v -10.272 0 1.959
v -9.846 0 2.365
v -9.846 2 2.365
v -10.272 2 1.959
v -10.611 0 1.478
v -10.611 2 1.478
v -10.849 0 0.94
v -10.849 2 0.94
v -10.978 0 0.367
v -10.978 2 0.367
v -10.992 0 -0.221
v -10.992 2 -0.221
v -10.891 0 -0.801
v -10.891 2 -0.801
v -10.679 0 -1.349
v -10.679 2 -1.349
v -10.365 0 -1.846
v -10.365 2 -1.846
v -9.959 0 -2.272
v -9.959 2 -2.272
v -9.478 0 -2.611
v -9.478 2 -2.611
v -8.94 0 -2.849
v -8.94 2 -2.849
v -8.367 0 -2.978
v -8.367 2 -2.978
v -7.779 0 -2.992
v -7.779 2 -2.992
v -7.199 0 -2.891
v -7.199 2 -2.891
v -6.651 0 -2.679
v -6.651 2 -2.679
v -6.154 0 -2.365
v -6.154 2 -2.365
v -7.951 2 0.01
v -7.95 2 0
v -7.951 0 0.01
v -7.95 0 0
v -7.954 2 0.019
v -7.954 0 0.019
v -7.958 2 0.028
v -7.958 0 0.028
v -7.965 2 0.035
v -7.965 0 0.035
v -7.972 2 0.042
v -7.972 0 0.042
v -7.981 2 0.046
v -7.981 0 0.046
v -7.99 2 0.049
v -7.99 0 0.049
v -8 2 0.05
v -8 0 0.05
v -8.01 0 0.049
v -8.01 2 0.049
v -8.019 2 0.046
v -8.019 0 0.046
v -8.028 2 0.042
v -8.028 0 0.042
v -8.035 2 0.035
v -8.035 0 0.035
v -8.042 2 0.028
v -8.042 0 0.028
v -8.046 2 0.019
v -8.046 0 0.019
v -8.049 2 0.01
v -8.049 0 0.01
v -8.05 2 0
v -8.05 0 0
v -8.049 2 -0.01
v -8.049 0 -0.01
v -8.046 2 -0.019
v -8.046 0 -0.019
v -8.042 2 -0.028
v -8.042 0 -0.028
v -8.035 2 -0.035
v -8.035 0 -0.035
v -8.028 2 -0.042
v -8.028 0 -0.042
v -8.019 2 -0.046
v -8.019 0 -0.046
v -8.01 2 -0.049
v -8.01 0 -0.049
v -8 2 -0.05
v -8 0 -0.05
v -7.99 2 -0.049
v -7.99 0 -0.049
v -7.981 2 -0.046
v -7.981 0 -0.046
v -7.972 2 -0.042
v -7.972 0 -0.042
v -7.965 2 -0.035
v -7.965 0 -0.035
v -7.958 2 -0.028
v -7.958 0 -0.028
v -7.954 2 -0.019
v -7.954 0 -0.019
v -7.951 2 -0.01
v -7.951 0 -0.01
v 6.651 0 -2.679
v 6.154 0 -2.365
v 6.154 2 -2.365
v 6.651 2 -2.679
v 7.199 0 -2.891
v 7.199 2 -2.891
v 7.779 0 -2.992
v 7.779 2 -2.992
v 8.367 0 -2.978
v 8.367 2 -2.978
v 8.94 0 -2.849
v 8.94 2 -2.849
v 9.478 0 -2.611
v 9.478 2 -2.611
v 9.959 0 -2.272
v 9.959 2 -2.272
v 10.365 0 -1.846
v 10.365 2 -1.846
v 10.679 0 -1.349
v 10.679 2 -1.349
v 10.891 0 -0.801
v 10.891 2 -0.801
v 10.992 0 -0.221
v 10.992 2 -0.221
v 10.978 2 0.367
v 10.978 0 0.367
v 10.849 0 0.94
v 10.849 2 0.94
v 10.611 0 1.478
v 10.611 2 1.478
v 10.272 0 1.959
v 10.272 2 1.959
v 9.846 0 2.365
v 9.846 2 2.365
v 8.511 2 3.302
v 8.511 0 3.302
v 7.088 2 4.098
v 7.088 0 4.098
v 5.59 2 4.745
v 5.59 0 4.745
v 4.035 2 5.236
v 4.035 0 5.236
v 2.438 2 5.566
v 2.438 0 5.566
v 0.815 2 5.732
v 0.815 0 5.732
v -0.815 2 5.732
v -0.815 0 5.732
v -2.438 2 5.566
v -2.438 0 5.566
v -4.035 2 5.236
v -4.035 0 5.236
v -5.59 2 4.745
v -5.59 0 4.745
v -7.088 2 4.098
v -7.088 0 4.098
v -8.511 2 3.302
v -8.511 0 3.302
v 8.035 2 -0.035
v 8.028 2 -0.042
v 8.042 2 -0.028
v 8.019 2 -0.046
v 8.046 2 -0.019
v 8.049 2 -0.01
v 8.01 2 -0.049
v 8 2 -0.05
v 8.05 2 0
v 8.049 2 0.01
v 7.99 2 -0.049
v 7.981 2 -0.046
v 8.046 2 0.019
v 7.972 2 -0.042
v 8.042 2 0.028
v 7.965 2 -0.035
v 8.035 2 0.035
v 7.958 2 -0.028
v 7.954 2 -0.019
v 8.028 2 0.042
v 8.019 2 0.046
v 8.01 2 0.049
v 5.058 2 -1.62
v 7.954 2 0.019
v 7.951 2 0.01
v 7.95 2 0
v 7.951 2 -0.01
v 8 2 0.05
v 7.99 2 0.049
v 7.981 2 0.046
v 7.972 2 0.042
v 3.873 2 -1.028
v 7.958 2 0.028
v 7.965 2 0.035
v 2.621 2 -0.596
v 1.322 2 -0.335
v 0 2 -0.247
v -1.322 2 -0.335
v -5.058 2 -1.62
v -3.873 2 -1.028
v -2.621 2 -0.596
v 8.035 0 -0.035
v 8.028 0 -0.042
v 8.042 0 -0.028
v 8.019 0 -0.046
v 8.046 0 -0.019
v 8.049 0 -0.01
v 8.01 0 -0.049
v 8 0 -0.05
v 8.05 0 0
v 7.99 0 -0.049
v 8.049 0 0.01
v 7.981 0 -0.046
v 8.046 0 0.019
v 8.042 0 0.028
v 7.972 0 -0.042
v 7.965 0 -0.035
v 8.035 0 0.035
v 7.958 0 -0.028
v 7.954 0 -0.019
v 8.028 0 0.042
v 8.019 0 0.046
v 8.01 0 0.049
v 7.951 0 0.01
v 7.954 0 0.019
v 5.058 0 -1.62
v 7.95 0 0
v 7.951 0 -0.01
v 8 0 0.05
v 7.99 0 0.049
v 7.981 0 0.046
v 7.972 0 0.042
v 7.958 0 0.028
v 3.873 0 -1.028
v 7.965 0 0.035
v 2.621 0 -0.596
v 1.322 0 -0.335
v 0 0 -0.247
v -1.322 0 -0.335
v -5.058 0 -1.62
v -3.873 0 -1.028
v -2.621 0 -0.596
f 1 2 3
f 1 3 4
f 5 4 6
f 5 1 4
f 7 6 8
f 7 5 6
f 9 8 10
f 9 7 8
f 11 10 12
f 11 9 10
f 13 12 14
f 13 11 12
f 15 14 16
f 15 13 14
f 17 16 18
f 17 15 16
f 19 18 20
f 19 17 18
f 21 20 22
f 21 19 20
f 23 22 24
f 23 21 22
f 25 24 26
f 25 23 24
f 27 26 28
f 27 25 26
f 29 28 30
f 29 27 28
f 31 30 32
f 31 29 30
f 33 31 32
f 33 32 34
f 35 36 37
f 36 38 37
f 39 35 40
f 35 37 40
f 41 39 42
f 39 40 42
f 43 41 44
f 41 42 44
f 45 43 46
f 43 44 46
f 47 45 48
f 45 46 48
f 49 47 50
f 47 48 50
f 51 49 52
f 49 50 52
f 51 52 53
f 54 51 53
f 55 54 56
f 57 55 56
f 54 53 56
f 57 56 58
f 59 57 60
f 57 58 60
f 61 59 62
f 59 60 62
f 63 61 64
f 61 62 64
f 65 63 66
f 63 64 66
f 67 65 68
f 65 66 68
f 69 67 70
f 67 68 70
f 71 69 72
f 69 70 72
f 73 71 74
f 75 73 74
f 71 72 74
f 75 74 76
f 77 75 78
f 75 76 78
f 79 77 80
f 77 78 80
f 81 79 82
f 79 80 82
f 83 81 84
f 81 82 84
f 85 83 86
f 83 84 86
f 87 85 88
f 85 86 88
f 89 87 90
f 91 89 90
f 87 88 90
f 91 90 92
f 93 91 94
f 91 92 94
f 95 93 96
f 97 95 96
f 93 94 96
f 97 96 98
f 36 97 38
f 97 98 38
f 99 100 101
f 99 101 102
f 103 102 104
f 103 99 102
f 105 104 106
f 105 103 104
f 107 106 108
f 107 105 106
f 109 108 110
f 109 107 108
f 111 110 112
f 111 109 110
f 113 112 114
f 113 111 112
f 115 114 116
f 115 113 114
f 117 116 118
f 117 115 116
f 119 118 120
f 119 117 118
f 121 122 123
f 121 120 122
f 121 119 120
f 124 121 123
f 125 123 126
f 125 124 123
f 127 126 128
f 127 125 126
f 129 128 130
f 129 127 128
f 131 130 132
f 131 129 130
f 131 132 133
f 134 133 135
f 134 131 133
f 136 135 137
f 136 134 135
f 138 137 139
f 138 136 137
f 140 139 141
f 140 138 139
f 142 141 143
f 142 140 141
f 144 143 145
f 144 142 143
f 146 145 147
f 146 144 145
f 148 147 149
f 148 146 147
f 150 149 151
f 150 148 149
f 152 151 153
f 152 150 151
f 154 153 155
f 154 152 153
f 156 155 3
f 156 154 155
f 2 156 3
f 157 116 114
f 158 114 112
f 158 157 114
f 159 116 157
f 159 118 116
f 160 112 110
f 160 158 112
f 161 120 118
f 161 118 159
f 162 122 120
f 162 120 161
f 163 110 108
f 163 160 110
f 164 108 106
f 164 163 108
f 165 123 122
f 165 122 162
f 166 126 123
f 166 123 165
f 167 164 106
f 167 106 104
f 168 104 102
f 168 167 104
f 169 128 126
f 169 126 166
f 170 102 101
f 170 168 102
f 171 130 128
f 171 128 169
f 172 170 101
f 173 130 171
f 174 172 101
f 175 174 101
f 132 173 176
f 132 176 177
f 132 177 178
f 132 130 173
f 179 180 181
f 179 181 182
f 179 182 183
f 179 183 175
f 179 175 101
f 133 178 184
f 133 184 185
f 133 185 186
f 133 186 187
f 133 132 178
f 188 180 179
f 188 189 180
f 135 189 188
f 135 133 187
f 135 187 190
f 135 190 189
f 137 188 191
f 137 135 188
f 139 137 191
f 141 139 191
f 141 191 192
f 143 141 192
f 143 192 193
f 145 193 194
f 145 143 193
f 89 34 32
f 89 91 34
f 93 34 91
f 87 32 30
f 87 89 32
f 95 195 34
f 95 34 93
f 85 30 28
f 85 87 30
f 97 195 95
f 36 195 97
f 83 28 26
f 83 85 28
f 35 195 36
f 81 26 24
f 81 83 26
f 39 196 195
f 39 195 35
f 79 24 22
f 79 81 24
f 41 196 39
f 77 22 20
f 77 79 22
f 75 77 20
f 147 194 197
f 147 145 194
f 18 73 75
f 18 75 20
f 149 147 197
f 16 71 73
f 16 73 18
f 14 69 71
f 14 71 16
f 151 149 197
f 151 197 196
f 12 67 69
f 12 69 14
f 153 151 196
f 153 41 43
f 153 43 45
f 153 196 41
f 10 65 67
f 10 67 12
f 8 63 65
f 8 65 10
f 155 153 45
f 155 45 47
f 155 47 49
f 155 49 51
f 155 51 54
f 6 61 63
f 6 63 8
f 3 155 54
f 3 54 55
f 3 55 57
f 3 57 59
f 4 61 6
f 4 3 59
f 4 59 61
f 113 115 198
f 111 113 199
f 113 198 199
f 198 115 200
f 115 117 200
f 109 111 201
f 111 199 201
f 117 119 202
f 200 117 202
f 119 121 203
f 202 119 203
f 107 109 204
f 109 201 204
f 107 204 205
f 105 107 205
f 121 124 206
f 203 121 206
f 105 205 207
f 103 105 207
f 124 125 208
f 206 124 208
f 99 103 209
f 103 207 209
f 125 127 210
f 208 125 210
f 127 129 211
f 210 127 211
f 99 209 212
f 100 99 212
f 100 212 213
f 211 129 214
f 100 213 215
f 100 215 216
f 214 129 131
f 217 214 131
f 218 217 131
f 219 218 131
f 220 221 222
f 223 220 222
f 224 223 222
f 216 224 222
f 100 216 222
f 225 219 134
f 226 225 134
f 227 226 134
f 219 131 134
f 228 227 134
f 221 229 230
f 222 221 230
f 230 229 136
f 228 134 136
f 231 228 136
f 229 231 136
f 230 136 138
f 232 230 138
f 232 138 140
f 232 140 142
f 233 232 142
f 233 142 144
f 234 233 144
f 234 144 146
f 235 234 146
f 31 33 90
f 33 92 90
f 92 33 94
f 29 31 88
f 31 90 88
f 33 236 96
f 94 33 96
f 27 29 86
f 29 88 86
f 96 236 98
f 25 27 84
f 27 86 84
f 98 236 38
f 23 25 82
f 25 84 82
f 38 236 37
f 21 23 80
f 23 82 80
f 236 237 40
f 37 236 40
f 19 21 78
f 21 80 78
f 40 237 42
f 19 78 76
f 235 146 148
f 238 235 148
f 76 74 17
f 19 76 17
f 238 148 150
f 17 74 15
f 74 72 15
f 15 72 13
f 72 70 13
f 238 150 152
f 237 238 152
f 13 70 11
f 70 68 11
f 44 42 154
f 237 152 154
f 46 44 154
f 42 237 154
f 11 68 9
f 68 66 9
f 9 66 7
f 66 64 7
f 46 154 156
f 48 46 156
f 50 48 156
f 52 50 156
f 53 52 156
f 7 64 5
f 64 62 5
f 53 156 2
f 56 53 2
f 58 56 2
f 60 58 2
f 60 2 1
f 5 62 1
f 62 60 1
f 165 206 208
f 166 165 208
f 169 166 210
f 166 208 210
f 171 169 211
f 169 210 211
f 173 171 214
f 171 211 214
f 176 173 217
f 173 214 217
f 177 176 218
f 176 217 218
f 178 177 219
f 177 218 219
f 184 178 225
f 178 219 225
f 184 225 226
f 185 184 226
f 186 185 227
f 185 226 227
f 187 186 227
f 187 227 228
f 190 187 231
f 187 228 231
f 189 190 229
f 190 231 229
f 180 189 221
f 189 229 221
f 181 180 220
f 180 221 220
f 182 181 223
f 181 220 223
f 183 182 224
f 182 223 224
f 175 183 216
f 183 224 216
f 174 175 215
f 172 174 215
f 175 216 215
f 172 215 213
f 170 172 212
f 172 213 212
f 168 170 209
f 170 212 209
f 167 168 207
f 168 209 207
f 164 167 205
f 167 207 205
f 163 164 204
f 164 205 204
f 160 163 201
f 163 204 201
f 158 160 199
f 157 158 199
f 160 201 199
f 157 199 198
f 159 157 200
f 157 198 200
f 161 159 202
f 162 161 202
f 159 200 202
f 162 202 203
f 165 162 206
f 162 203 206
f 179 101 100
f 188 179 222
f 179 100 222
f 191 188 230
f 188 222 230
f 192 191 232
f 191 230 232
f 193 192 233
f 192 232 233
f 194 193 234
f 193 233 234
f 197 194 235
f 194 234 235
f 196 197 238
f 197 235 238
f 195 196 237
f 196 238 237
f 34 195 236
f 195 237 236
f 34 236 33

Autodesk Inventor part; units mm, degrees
ref_plane "YZ Plane" through (0, 0, 0) normal (1, 0, 0) x (0, 1, 0)
ref_plane "XZ Plane" through (0, 0, 0) normal (0, 1, 0) x (-1, 0, 0)
ref_plane "XY Plane" through (0, 0, 0) normal (0, 0, 1) x (1, 0, 0)
sketch "Sketch1" plane through (0, 0, 0) normal (0, 1, 0) x (-1, 0, 0)
  circle A0 centre (8, 0) radius 3
  line L0 (8, 0) -> (-8, 0)
  circle A1 centre (-8, 0) radius 3
  arc A2 (6.1538, -2.3647) -> (-6.1538, -2.3647) centre (0, -10.247) ccw
  line L1 (0, -0.247) -> (0, 5.753)
  arc A3 (9.8462, 2.3647) -> (-9.8462, 2.3647) centre (0, -10.247) ccw
  circle A4 centre (8, 0) radius 1.5
  circle A5 centre (-8, 0) radius 1.5
  point P0 (0, 0)
  dimension "d13" = 16
  dimension "d14" = 6
  dimension "d16" = 6
  dimension "d17" = 3
  dimension "d18" = 3
extrude "Extrusion1" add sketch "Sketch1" along normal blind 2
sketch "Sketch2" plane through (0, 0, 0) normal (0, -1, 0) x (1, 0, 0)
  circle A0 centre (8, 0) radius 1.5 projected
  circle A1 centre (-8, 0) radius 1.5 projected
  arc A2 (6.1538, -2.3647) -> (9.8462, 2.3647) centre (8, 0) ccw projected
  arc A3 (-9.8462, 2.3647) -> (-6.1538, -2.3647) centre (-8, 0) ccw projected
  circle A4 centre (-8, 0) radius 0.05
  circle A5 centre (8, 0) radius 0.05
  point P0 (0, 0)
  dimension "d21" = 0.1
  dimension "d22" = 0.1
extrude "Extrusion2" add sketch "Sketch2" against normal blind 2
properties part number "tahlo-neco_sablona"
